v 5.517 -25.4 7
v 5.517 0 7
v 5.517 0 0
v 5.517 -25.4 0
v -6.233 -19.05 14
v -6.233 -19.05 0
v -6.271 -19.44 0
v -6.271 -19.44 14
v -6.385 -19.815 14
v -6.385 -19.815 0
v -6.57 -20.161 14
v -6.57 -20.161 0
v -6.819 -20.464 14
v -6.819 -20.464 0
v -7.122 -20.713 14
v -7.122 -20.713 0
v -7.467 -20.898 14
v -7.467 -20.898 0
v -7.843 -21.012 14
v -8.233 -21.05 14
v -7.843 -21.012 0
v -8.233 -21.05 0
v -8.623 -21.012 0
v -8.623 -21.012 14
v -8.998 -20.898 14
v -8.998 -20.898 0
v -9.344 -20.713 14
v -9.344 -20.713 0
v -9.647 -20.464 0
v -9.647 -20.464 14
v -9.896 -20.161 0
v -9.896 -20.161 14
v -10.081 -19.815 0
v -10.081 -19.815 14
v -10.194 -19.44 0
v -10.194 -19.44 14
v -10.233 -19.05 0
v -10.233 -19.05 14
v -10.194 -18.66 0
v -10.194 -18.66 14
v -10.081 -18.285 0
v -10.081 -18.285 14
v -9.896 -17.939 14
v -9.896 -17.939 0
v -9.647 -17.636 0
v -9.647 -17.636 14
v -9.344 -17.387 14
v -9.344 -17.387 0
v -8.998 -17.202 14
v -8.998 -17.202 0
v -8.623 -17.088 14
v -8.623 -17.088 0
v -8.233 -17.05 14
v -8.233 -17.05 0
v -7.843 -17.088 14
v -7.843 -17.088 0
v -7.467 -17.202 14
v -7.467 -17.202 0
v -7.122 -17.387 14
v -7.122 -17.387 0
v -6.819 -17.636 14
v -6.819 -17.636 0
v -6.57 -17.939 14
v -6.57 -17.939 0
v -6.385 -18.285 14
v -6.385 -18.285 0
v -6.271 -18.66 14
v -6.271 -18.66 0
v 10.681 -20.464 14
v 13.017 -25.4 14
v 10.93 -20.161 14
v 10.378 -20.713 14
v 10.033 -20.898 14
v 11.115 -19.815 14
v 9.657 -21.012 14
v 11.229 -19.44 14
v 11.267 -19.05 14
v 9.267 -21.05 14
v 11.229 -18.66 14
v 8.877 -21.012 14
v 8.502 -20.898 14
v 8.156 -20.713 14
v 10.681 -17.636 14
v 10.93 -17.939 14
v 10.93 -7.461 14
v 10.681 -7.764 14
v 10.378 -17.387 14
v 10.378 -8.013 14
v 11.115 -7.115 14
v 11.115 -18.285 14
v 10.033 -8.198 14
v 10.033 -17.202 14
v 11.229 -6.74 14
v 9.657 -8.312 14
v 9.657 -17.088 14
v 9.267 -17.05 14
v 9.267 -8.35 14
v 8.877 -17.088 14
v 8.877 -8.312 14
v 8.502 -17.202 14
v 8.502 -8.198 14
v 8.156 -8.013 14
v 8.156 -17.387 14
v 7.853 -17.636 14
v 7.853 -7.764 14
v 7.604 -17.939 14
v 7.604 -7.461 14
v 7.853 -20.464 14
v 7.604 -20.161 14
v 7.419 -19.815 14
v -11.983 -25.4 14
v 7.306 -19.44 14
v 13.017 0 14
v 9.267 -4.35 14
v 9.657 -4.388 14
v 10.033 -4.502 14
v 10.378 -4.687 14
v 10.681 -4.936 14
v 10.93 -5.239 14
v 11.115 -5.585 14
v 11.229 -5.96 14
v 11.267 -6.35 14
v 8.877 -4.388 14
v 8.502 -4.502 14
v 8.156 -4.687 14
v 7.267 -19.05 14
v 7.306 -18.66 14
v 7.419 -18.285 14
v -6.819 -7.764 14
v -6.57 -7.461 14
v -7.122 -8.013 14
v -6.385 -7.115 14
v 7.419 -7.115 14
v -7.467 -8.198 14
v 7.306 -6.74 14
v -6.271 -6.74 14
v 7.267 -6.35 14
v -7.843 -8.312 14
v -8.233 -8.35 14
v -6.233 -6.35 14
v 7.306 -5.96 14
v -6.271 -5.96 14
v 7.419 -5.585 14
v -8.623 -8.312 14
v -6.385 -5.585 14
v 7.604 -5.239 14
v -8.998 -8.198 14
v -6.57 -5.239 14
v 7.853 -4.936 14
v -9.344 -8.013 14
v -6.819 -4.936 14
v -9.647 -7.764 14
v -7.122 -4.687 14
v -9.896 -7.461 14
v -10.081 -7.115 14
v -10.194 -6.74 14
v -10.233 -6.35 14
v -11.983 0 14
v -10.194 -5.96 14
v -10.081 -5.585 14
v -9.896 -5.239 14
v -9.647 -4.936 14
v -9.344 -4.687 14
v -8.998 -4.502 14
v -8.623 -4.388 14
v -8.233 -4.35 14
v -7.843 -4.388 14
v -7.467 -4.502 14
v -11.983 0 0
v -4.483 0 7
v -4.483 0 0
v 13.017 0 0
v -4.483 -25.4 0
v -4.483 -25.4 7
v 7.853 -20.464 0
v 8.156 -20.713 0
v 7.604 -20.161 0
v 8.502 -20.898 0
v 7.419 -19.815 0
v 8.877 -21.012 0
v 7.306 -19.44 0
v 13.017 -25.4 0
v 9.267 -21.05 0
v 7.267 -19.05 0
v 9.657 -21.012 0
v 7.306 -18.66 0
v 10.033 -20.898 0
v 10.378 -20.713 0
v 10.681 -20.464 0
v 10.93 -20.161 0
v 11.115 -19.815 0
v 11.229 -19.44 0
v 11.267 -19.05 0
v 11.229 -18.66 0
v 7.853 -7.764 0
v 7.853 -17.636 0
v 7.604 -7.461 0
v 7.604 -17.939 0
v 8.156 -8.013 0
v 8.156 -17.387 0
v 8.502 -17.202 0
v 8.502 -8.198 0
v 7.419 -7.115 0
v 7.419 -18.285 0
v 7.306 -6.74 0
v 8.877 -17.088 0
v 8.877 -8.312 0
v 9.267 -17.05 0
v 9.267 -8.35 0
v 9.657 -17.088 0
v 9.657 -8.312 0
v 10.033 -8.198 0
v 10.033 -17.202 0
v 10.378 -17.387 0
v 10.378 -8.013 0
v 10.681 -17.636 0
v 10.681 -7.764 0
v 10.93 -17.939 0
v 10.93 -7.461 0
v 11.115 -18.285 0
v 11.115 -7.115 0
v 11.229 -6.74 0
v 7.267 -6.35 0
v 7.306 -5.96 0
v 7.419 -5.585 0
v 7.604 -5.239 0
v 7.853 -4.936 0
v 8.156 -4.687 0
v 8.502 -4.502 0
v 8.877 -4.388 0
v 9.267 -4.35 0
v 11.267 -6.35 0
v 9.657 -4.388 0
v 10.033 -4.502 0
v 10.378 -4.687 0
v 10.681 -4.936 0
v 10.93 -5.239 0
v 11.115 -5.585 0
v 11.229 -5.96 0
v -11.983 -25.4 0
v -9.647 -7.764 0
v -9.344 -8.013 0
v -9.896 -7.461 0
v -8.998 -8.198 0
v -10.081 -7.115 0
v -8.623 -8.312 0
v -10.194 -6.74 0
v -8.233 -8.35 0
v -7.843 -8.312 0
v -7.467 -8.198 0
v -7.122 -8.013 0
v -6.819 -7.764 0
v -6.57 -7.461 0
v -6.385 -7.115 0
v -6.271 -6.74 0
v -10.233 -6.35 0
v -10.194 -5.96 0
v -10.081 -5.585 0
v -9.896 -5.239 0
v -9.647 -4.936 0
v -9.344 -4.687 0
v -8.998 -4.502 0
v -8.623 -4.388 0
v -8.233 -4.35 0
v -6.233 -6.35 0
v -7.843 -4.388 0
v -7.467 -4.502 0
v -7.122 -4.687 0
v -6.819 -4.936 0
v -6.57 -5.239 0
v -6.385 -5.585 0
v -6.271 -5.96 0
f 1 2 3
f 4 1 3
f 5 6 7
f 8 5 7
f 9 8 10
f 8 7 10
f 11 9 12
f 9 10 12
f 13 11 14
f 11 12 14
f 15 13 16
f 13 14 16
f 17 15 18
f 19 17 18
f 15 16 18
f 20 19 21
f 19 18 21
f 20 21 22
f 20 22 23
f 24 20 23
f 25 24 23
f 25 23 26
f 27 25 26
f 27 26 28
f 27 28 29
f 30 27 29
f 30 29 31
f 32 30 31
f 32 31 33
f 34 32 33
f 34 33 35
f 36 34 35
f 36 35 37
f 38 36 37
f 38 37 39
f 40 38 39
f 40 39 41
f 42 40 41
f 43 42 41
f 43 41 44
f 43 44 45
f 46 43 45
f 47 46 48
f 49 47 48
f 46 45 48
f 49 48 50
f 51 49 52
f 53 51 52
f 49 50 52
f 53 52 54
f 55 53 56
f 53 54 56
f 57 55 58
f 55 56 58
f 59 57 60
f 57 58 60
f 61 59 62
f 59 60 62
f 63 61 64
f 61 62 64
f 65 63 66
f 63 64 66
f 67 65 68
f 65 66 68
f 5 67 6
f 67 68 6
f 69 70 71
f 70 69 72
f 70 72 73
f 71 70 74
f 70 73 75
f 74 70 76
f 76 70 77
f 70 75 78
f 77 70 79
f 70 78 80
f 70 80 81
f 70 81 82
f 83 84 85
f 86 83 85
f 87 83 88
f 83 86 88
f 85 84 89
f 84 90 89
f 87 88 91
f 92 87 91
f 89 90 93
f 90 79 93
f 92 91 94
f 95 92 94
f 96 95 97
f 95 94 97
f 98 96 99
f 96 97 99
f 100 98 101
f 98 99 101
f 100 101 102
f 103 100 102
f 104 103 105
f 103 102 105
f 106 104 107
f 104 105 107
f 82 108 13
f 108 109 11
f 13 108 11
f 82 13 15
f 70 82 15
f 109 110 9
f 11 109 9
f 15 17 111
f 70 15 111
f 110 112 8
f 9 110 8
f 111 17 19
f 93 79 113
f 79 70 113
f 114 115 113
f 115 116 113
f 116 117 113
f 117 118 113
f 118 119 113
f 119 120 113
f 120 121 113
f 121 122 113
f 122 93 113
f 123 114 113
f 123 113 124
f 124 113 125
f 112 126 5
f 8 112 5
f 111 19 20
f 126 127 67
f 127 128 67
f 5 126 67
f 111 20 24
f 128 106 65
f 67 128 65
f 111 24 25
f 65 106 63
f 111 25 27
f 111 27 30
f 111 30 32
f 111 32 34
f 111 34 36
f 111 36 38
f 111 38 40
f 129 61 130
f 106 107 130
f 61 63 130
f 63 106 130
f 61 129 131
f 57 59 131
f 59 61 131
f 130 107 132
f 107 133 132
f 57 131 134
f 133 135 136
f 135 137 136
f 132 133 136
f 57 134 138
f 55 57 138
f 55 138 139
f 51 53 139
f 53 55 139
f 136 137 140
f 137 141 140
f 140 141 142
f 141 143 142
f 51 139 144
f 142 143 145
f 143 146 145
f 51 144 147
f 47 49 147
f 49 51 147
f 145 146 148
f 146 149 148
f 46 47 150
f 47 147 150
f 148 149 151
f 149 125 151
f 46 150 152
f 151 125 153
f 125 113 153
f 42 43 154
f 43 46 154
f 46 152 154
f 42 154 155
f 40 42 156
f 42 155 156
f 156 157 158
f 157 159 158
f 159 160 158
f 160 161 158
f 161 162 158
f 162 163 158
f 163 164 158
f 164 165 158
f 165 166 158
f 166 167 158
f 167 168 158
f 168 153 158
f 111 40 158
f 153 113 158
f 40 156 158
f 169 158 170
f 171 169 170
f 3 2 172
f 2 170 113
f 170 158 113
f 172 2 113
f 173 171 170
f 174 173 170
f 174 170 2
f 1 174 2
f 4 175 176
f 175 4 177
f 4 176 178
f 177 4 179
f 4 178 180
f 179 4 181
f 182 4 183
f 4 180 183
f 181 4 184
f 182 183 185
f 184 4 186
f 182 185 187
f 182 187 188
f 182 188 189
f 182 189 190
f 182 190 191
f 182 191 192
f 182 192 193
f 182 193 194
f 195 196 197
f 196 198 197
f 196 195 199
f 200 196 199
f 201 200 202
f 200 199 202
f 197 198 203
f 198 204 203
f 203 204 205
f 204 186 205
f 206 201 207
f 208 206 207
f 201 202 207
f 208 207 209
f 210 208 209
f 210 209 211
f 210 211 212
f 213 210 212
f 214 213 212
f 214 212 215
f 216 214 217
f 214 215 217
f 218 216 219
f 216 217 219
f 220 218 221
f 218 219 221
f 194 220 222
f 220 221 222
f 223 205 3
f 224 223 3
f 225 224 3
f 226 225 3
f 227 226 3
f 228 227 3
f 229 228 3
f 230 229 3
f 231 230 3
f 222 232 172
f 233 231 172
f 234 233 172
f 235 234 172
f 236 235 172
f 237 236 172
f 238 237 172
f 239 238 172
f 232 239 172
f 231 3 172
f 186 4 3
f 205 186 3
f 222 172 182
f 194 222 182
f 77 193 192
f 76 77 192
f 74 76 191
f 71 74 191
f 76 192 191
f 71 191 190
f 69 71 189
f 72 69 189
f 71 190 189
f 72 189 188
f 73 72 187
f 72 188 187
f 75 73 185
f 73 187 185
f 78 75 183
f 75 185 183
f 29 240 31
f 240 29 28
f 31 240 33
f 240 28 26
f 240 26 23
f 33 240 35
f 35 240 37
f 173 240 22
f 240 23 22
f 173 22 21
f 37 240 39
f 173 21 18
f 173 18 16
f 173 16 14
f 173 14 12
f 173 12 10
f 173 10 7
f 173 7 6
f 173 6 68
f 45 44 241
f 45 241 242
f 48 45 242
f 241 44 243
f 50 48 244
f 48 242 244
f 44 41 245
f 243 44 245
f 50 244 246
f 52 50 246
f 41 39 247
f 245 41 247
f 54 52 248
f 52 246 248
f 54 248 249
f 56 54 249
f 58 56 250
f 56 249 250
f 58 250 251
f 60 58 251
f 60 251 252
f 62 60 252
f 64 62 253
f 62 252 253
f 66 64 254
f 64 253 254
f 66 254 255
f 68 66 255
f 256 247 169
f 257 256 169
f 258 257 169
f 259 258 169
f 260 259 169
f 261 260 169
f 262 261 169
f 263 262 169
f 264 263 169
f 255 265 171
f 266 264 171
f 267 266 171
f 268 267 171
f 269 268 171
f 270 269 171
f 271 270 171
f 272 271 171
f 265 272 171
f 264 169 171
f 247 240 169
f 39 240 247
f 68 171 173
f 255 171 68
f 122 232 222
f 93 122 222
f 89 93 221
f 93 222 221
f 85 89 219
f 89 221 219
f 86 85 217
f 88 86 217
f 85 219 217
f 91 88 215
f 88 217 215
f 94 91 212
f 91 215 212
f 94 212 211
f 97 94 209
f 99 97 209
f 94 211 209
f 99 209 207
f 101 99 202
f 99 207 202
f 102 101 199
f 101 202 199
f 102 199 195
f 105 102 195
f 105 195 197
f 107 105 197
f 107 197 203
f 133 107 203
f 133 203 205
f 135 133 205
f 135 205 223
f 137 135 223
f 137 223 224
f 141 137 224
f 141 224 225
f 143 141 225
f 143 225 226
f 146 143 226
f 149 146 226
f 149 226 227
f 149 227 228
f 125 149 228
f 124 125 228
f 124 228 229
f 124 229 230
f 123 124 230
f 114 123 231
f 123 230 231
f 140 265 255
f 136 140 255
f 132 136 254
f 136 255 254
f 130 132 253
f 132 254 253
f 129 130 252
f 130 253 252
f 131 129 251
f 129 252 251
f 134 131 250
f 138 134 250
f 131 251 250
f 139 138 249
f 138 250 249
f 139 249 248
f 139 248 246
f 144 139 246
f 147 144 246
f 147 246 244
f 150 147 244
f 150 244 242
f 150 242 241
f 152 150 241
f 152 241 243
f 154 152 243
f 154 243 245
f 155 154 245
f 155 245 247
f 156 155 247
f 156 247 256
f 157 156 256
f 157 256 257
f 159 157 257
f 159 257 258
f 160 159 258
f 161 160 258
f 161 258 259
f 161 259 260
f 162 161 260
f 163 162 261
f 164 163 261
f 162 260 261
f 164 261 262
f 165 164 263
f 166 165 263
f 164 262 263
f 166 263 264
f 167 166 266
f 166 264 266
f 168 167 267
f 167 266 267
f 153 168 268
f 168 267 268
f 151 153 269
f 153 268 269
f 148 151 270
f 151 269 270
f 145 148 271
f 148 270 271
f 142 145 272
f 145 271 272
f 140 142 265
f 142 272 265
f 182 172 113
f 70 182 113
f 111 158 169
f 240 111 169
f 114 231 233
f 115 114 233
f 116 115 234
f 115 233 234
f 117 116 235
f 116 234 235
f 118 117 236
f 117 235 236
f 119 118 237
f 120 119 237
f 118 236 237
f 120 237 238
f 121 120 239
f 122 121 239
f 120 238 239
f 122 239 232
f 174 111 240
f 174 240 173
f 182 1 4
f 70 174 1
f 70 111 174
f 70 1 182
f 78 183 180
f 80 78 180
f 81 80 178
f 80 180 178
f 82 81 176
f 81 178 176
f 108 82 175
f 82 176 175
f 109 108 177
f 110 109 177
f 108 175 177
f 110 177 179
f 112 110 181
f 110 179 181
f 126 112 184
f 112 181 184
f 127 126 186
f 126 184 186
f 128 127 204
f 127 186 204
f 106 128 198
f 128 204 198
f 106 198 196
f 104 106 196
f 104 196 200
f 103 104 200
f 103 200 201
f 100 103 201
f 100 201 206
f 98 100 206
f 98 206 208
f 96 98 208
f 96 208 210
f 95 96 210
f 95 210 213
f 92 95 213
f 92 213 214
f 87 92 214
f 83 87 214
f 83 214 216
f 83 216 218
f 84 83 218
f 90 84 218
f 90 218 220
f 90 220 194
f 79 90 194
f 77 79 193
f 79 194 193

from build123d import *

# Parameters (mm, degrees)
F1_DEPTH = 25.4
F2_R     = 2
F3_DEPTH = 14.001


with BuildPart() as f1:
    # F0 (on Front) → F1 (new body)
    with BuildSketch(Plane.XZ):
        Polygon((-11.982759, 14), (-11.982759, 0), (-4.482759, 0), (-4.482759, 7), (5.517241, 7), (5.517241, 0), (13.017241, 0), (13.017241, 14), align=None)
    extrude(amount=F1_DEPTH)

    # F2 (on face) → F3 (cut, through all)
    with BuildSketch(Plane(origin=(0, 0, 0), x_dir=(1, 0, 0), z_dir=(0, 0, -1))):
        with BuildLine():
            ThreePointArc((9.267241, 21.05), (7.853028, 17.635786), (11.267241, 19.05))
            ThreePointArc((11.267241, 19.05), (10.681455, 20.464214), (9.267241, 21.05))
        make_face()
        with BuildLine():
            ThreePointArc((9.267241, 4.35), (10.681455, 4.935786), (11.267241, 6.35))
            ThreePointArc((11.267241, 6.35), (7.853028, 7.764214), (9.267241, 4.35))
        make_face()
        with Locations((-8.232759, 6.35)):
            Circle(F2_R)
        with Locations((-8.232759, 19.05)):
            Circle(F2_R)
    extrude(amount=-F3_DEPTH, mode=Mode.SUBTRACT)


solid = f1.part
